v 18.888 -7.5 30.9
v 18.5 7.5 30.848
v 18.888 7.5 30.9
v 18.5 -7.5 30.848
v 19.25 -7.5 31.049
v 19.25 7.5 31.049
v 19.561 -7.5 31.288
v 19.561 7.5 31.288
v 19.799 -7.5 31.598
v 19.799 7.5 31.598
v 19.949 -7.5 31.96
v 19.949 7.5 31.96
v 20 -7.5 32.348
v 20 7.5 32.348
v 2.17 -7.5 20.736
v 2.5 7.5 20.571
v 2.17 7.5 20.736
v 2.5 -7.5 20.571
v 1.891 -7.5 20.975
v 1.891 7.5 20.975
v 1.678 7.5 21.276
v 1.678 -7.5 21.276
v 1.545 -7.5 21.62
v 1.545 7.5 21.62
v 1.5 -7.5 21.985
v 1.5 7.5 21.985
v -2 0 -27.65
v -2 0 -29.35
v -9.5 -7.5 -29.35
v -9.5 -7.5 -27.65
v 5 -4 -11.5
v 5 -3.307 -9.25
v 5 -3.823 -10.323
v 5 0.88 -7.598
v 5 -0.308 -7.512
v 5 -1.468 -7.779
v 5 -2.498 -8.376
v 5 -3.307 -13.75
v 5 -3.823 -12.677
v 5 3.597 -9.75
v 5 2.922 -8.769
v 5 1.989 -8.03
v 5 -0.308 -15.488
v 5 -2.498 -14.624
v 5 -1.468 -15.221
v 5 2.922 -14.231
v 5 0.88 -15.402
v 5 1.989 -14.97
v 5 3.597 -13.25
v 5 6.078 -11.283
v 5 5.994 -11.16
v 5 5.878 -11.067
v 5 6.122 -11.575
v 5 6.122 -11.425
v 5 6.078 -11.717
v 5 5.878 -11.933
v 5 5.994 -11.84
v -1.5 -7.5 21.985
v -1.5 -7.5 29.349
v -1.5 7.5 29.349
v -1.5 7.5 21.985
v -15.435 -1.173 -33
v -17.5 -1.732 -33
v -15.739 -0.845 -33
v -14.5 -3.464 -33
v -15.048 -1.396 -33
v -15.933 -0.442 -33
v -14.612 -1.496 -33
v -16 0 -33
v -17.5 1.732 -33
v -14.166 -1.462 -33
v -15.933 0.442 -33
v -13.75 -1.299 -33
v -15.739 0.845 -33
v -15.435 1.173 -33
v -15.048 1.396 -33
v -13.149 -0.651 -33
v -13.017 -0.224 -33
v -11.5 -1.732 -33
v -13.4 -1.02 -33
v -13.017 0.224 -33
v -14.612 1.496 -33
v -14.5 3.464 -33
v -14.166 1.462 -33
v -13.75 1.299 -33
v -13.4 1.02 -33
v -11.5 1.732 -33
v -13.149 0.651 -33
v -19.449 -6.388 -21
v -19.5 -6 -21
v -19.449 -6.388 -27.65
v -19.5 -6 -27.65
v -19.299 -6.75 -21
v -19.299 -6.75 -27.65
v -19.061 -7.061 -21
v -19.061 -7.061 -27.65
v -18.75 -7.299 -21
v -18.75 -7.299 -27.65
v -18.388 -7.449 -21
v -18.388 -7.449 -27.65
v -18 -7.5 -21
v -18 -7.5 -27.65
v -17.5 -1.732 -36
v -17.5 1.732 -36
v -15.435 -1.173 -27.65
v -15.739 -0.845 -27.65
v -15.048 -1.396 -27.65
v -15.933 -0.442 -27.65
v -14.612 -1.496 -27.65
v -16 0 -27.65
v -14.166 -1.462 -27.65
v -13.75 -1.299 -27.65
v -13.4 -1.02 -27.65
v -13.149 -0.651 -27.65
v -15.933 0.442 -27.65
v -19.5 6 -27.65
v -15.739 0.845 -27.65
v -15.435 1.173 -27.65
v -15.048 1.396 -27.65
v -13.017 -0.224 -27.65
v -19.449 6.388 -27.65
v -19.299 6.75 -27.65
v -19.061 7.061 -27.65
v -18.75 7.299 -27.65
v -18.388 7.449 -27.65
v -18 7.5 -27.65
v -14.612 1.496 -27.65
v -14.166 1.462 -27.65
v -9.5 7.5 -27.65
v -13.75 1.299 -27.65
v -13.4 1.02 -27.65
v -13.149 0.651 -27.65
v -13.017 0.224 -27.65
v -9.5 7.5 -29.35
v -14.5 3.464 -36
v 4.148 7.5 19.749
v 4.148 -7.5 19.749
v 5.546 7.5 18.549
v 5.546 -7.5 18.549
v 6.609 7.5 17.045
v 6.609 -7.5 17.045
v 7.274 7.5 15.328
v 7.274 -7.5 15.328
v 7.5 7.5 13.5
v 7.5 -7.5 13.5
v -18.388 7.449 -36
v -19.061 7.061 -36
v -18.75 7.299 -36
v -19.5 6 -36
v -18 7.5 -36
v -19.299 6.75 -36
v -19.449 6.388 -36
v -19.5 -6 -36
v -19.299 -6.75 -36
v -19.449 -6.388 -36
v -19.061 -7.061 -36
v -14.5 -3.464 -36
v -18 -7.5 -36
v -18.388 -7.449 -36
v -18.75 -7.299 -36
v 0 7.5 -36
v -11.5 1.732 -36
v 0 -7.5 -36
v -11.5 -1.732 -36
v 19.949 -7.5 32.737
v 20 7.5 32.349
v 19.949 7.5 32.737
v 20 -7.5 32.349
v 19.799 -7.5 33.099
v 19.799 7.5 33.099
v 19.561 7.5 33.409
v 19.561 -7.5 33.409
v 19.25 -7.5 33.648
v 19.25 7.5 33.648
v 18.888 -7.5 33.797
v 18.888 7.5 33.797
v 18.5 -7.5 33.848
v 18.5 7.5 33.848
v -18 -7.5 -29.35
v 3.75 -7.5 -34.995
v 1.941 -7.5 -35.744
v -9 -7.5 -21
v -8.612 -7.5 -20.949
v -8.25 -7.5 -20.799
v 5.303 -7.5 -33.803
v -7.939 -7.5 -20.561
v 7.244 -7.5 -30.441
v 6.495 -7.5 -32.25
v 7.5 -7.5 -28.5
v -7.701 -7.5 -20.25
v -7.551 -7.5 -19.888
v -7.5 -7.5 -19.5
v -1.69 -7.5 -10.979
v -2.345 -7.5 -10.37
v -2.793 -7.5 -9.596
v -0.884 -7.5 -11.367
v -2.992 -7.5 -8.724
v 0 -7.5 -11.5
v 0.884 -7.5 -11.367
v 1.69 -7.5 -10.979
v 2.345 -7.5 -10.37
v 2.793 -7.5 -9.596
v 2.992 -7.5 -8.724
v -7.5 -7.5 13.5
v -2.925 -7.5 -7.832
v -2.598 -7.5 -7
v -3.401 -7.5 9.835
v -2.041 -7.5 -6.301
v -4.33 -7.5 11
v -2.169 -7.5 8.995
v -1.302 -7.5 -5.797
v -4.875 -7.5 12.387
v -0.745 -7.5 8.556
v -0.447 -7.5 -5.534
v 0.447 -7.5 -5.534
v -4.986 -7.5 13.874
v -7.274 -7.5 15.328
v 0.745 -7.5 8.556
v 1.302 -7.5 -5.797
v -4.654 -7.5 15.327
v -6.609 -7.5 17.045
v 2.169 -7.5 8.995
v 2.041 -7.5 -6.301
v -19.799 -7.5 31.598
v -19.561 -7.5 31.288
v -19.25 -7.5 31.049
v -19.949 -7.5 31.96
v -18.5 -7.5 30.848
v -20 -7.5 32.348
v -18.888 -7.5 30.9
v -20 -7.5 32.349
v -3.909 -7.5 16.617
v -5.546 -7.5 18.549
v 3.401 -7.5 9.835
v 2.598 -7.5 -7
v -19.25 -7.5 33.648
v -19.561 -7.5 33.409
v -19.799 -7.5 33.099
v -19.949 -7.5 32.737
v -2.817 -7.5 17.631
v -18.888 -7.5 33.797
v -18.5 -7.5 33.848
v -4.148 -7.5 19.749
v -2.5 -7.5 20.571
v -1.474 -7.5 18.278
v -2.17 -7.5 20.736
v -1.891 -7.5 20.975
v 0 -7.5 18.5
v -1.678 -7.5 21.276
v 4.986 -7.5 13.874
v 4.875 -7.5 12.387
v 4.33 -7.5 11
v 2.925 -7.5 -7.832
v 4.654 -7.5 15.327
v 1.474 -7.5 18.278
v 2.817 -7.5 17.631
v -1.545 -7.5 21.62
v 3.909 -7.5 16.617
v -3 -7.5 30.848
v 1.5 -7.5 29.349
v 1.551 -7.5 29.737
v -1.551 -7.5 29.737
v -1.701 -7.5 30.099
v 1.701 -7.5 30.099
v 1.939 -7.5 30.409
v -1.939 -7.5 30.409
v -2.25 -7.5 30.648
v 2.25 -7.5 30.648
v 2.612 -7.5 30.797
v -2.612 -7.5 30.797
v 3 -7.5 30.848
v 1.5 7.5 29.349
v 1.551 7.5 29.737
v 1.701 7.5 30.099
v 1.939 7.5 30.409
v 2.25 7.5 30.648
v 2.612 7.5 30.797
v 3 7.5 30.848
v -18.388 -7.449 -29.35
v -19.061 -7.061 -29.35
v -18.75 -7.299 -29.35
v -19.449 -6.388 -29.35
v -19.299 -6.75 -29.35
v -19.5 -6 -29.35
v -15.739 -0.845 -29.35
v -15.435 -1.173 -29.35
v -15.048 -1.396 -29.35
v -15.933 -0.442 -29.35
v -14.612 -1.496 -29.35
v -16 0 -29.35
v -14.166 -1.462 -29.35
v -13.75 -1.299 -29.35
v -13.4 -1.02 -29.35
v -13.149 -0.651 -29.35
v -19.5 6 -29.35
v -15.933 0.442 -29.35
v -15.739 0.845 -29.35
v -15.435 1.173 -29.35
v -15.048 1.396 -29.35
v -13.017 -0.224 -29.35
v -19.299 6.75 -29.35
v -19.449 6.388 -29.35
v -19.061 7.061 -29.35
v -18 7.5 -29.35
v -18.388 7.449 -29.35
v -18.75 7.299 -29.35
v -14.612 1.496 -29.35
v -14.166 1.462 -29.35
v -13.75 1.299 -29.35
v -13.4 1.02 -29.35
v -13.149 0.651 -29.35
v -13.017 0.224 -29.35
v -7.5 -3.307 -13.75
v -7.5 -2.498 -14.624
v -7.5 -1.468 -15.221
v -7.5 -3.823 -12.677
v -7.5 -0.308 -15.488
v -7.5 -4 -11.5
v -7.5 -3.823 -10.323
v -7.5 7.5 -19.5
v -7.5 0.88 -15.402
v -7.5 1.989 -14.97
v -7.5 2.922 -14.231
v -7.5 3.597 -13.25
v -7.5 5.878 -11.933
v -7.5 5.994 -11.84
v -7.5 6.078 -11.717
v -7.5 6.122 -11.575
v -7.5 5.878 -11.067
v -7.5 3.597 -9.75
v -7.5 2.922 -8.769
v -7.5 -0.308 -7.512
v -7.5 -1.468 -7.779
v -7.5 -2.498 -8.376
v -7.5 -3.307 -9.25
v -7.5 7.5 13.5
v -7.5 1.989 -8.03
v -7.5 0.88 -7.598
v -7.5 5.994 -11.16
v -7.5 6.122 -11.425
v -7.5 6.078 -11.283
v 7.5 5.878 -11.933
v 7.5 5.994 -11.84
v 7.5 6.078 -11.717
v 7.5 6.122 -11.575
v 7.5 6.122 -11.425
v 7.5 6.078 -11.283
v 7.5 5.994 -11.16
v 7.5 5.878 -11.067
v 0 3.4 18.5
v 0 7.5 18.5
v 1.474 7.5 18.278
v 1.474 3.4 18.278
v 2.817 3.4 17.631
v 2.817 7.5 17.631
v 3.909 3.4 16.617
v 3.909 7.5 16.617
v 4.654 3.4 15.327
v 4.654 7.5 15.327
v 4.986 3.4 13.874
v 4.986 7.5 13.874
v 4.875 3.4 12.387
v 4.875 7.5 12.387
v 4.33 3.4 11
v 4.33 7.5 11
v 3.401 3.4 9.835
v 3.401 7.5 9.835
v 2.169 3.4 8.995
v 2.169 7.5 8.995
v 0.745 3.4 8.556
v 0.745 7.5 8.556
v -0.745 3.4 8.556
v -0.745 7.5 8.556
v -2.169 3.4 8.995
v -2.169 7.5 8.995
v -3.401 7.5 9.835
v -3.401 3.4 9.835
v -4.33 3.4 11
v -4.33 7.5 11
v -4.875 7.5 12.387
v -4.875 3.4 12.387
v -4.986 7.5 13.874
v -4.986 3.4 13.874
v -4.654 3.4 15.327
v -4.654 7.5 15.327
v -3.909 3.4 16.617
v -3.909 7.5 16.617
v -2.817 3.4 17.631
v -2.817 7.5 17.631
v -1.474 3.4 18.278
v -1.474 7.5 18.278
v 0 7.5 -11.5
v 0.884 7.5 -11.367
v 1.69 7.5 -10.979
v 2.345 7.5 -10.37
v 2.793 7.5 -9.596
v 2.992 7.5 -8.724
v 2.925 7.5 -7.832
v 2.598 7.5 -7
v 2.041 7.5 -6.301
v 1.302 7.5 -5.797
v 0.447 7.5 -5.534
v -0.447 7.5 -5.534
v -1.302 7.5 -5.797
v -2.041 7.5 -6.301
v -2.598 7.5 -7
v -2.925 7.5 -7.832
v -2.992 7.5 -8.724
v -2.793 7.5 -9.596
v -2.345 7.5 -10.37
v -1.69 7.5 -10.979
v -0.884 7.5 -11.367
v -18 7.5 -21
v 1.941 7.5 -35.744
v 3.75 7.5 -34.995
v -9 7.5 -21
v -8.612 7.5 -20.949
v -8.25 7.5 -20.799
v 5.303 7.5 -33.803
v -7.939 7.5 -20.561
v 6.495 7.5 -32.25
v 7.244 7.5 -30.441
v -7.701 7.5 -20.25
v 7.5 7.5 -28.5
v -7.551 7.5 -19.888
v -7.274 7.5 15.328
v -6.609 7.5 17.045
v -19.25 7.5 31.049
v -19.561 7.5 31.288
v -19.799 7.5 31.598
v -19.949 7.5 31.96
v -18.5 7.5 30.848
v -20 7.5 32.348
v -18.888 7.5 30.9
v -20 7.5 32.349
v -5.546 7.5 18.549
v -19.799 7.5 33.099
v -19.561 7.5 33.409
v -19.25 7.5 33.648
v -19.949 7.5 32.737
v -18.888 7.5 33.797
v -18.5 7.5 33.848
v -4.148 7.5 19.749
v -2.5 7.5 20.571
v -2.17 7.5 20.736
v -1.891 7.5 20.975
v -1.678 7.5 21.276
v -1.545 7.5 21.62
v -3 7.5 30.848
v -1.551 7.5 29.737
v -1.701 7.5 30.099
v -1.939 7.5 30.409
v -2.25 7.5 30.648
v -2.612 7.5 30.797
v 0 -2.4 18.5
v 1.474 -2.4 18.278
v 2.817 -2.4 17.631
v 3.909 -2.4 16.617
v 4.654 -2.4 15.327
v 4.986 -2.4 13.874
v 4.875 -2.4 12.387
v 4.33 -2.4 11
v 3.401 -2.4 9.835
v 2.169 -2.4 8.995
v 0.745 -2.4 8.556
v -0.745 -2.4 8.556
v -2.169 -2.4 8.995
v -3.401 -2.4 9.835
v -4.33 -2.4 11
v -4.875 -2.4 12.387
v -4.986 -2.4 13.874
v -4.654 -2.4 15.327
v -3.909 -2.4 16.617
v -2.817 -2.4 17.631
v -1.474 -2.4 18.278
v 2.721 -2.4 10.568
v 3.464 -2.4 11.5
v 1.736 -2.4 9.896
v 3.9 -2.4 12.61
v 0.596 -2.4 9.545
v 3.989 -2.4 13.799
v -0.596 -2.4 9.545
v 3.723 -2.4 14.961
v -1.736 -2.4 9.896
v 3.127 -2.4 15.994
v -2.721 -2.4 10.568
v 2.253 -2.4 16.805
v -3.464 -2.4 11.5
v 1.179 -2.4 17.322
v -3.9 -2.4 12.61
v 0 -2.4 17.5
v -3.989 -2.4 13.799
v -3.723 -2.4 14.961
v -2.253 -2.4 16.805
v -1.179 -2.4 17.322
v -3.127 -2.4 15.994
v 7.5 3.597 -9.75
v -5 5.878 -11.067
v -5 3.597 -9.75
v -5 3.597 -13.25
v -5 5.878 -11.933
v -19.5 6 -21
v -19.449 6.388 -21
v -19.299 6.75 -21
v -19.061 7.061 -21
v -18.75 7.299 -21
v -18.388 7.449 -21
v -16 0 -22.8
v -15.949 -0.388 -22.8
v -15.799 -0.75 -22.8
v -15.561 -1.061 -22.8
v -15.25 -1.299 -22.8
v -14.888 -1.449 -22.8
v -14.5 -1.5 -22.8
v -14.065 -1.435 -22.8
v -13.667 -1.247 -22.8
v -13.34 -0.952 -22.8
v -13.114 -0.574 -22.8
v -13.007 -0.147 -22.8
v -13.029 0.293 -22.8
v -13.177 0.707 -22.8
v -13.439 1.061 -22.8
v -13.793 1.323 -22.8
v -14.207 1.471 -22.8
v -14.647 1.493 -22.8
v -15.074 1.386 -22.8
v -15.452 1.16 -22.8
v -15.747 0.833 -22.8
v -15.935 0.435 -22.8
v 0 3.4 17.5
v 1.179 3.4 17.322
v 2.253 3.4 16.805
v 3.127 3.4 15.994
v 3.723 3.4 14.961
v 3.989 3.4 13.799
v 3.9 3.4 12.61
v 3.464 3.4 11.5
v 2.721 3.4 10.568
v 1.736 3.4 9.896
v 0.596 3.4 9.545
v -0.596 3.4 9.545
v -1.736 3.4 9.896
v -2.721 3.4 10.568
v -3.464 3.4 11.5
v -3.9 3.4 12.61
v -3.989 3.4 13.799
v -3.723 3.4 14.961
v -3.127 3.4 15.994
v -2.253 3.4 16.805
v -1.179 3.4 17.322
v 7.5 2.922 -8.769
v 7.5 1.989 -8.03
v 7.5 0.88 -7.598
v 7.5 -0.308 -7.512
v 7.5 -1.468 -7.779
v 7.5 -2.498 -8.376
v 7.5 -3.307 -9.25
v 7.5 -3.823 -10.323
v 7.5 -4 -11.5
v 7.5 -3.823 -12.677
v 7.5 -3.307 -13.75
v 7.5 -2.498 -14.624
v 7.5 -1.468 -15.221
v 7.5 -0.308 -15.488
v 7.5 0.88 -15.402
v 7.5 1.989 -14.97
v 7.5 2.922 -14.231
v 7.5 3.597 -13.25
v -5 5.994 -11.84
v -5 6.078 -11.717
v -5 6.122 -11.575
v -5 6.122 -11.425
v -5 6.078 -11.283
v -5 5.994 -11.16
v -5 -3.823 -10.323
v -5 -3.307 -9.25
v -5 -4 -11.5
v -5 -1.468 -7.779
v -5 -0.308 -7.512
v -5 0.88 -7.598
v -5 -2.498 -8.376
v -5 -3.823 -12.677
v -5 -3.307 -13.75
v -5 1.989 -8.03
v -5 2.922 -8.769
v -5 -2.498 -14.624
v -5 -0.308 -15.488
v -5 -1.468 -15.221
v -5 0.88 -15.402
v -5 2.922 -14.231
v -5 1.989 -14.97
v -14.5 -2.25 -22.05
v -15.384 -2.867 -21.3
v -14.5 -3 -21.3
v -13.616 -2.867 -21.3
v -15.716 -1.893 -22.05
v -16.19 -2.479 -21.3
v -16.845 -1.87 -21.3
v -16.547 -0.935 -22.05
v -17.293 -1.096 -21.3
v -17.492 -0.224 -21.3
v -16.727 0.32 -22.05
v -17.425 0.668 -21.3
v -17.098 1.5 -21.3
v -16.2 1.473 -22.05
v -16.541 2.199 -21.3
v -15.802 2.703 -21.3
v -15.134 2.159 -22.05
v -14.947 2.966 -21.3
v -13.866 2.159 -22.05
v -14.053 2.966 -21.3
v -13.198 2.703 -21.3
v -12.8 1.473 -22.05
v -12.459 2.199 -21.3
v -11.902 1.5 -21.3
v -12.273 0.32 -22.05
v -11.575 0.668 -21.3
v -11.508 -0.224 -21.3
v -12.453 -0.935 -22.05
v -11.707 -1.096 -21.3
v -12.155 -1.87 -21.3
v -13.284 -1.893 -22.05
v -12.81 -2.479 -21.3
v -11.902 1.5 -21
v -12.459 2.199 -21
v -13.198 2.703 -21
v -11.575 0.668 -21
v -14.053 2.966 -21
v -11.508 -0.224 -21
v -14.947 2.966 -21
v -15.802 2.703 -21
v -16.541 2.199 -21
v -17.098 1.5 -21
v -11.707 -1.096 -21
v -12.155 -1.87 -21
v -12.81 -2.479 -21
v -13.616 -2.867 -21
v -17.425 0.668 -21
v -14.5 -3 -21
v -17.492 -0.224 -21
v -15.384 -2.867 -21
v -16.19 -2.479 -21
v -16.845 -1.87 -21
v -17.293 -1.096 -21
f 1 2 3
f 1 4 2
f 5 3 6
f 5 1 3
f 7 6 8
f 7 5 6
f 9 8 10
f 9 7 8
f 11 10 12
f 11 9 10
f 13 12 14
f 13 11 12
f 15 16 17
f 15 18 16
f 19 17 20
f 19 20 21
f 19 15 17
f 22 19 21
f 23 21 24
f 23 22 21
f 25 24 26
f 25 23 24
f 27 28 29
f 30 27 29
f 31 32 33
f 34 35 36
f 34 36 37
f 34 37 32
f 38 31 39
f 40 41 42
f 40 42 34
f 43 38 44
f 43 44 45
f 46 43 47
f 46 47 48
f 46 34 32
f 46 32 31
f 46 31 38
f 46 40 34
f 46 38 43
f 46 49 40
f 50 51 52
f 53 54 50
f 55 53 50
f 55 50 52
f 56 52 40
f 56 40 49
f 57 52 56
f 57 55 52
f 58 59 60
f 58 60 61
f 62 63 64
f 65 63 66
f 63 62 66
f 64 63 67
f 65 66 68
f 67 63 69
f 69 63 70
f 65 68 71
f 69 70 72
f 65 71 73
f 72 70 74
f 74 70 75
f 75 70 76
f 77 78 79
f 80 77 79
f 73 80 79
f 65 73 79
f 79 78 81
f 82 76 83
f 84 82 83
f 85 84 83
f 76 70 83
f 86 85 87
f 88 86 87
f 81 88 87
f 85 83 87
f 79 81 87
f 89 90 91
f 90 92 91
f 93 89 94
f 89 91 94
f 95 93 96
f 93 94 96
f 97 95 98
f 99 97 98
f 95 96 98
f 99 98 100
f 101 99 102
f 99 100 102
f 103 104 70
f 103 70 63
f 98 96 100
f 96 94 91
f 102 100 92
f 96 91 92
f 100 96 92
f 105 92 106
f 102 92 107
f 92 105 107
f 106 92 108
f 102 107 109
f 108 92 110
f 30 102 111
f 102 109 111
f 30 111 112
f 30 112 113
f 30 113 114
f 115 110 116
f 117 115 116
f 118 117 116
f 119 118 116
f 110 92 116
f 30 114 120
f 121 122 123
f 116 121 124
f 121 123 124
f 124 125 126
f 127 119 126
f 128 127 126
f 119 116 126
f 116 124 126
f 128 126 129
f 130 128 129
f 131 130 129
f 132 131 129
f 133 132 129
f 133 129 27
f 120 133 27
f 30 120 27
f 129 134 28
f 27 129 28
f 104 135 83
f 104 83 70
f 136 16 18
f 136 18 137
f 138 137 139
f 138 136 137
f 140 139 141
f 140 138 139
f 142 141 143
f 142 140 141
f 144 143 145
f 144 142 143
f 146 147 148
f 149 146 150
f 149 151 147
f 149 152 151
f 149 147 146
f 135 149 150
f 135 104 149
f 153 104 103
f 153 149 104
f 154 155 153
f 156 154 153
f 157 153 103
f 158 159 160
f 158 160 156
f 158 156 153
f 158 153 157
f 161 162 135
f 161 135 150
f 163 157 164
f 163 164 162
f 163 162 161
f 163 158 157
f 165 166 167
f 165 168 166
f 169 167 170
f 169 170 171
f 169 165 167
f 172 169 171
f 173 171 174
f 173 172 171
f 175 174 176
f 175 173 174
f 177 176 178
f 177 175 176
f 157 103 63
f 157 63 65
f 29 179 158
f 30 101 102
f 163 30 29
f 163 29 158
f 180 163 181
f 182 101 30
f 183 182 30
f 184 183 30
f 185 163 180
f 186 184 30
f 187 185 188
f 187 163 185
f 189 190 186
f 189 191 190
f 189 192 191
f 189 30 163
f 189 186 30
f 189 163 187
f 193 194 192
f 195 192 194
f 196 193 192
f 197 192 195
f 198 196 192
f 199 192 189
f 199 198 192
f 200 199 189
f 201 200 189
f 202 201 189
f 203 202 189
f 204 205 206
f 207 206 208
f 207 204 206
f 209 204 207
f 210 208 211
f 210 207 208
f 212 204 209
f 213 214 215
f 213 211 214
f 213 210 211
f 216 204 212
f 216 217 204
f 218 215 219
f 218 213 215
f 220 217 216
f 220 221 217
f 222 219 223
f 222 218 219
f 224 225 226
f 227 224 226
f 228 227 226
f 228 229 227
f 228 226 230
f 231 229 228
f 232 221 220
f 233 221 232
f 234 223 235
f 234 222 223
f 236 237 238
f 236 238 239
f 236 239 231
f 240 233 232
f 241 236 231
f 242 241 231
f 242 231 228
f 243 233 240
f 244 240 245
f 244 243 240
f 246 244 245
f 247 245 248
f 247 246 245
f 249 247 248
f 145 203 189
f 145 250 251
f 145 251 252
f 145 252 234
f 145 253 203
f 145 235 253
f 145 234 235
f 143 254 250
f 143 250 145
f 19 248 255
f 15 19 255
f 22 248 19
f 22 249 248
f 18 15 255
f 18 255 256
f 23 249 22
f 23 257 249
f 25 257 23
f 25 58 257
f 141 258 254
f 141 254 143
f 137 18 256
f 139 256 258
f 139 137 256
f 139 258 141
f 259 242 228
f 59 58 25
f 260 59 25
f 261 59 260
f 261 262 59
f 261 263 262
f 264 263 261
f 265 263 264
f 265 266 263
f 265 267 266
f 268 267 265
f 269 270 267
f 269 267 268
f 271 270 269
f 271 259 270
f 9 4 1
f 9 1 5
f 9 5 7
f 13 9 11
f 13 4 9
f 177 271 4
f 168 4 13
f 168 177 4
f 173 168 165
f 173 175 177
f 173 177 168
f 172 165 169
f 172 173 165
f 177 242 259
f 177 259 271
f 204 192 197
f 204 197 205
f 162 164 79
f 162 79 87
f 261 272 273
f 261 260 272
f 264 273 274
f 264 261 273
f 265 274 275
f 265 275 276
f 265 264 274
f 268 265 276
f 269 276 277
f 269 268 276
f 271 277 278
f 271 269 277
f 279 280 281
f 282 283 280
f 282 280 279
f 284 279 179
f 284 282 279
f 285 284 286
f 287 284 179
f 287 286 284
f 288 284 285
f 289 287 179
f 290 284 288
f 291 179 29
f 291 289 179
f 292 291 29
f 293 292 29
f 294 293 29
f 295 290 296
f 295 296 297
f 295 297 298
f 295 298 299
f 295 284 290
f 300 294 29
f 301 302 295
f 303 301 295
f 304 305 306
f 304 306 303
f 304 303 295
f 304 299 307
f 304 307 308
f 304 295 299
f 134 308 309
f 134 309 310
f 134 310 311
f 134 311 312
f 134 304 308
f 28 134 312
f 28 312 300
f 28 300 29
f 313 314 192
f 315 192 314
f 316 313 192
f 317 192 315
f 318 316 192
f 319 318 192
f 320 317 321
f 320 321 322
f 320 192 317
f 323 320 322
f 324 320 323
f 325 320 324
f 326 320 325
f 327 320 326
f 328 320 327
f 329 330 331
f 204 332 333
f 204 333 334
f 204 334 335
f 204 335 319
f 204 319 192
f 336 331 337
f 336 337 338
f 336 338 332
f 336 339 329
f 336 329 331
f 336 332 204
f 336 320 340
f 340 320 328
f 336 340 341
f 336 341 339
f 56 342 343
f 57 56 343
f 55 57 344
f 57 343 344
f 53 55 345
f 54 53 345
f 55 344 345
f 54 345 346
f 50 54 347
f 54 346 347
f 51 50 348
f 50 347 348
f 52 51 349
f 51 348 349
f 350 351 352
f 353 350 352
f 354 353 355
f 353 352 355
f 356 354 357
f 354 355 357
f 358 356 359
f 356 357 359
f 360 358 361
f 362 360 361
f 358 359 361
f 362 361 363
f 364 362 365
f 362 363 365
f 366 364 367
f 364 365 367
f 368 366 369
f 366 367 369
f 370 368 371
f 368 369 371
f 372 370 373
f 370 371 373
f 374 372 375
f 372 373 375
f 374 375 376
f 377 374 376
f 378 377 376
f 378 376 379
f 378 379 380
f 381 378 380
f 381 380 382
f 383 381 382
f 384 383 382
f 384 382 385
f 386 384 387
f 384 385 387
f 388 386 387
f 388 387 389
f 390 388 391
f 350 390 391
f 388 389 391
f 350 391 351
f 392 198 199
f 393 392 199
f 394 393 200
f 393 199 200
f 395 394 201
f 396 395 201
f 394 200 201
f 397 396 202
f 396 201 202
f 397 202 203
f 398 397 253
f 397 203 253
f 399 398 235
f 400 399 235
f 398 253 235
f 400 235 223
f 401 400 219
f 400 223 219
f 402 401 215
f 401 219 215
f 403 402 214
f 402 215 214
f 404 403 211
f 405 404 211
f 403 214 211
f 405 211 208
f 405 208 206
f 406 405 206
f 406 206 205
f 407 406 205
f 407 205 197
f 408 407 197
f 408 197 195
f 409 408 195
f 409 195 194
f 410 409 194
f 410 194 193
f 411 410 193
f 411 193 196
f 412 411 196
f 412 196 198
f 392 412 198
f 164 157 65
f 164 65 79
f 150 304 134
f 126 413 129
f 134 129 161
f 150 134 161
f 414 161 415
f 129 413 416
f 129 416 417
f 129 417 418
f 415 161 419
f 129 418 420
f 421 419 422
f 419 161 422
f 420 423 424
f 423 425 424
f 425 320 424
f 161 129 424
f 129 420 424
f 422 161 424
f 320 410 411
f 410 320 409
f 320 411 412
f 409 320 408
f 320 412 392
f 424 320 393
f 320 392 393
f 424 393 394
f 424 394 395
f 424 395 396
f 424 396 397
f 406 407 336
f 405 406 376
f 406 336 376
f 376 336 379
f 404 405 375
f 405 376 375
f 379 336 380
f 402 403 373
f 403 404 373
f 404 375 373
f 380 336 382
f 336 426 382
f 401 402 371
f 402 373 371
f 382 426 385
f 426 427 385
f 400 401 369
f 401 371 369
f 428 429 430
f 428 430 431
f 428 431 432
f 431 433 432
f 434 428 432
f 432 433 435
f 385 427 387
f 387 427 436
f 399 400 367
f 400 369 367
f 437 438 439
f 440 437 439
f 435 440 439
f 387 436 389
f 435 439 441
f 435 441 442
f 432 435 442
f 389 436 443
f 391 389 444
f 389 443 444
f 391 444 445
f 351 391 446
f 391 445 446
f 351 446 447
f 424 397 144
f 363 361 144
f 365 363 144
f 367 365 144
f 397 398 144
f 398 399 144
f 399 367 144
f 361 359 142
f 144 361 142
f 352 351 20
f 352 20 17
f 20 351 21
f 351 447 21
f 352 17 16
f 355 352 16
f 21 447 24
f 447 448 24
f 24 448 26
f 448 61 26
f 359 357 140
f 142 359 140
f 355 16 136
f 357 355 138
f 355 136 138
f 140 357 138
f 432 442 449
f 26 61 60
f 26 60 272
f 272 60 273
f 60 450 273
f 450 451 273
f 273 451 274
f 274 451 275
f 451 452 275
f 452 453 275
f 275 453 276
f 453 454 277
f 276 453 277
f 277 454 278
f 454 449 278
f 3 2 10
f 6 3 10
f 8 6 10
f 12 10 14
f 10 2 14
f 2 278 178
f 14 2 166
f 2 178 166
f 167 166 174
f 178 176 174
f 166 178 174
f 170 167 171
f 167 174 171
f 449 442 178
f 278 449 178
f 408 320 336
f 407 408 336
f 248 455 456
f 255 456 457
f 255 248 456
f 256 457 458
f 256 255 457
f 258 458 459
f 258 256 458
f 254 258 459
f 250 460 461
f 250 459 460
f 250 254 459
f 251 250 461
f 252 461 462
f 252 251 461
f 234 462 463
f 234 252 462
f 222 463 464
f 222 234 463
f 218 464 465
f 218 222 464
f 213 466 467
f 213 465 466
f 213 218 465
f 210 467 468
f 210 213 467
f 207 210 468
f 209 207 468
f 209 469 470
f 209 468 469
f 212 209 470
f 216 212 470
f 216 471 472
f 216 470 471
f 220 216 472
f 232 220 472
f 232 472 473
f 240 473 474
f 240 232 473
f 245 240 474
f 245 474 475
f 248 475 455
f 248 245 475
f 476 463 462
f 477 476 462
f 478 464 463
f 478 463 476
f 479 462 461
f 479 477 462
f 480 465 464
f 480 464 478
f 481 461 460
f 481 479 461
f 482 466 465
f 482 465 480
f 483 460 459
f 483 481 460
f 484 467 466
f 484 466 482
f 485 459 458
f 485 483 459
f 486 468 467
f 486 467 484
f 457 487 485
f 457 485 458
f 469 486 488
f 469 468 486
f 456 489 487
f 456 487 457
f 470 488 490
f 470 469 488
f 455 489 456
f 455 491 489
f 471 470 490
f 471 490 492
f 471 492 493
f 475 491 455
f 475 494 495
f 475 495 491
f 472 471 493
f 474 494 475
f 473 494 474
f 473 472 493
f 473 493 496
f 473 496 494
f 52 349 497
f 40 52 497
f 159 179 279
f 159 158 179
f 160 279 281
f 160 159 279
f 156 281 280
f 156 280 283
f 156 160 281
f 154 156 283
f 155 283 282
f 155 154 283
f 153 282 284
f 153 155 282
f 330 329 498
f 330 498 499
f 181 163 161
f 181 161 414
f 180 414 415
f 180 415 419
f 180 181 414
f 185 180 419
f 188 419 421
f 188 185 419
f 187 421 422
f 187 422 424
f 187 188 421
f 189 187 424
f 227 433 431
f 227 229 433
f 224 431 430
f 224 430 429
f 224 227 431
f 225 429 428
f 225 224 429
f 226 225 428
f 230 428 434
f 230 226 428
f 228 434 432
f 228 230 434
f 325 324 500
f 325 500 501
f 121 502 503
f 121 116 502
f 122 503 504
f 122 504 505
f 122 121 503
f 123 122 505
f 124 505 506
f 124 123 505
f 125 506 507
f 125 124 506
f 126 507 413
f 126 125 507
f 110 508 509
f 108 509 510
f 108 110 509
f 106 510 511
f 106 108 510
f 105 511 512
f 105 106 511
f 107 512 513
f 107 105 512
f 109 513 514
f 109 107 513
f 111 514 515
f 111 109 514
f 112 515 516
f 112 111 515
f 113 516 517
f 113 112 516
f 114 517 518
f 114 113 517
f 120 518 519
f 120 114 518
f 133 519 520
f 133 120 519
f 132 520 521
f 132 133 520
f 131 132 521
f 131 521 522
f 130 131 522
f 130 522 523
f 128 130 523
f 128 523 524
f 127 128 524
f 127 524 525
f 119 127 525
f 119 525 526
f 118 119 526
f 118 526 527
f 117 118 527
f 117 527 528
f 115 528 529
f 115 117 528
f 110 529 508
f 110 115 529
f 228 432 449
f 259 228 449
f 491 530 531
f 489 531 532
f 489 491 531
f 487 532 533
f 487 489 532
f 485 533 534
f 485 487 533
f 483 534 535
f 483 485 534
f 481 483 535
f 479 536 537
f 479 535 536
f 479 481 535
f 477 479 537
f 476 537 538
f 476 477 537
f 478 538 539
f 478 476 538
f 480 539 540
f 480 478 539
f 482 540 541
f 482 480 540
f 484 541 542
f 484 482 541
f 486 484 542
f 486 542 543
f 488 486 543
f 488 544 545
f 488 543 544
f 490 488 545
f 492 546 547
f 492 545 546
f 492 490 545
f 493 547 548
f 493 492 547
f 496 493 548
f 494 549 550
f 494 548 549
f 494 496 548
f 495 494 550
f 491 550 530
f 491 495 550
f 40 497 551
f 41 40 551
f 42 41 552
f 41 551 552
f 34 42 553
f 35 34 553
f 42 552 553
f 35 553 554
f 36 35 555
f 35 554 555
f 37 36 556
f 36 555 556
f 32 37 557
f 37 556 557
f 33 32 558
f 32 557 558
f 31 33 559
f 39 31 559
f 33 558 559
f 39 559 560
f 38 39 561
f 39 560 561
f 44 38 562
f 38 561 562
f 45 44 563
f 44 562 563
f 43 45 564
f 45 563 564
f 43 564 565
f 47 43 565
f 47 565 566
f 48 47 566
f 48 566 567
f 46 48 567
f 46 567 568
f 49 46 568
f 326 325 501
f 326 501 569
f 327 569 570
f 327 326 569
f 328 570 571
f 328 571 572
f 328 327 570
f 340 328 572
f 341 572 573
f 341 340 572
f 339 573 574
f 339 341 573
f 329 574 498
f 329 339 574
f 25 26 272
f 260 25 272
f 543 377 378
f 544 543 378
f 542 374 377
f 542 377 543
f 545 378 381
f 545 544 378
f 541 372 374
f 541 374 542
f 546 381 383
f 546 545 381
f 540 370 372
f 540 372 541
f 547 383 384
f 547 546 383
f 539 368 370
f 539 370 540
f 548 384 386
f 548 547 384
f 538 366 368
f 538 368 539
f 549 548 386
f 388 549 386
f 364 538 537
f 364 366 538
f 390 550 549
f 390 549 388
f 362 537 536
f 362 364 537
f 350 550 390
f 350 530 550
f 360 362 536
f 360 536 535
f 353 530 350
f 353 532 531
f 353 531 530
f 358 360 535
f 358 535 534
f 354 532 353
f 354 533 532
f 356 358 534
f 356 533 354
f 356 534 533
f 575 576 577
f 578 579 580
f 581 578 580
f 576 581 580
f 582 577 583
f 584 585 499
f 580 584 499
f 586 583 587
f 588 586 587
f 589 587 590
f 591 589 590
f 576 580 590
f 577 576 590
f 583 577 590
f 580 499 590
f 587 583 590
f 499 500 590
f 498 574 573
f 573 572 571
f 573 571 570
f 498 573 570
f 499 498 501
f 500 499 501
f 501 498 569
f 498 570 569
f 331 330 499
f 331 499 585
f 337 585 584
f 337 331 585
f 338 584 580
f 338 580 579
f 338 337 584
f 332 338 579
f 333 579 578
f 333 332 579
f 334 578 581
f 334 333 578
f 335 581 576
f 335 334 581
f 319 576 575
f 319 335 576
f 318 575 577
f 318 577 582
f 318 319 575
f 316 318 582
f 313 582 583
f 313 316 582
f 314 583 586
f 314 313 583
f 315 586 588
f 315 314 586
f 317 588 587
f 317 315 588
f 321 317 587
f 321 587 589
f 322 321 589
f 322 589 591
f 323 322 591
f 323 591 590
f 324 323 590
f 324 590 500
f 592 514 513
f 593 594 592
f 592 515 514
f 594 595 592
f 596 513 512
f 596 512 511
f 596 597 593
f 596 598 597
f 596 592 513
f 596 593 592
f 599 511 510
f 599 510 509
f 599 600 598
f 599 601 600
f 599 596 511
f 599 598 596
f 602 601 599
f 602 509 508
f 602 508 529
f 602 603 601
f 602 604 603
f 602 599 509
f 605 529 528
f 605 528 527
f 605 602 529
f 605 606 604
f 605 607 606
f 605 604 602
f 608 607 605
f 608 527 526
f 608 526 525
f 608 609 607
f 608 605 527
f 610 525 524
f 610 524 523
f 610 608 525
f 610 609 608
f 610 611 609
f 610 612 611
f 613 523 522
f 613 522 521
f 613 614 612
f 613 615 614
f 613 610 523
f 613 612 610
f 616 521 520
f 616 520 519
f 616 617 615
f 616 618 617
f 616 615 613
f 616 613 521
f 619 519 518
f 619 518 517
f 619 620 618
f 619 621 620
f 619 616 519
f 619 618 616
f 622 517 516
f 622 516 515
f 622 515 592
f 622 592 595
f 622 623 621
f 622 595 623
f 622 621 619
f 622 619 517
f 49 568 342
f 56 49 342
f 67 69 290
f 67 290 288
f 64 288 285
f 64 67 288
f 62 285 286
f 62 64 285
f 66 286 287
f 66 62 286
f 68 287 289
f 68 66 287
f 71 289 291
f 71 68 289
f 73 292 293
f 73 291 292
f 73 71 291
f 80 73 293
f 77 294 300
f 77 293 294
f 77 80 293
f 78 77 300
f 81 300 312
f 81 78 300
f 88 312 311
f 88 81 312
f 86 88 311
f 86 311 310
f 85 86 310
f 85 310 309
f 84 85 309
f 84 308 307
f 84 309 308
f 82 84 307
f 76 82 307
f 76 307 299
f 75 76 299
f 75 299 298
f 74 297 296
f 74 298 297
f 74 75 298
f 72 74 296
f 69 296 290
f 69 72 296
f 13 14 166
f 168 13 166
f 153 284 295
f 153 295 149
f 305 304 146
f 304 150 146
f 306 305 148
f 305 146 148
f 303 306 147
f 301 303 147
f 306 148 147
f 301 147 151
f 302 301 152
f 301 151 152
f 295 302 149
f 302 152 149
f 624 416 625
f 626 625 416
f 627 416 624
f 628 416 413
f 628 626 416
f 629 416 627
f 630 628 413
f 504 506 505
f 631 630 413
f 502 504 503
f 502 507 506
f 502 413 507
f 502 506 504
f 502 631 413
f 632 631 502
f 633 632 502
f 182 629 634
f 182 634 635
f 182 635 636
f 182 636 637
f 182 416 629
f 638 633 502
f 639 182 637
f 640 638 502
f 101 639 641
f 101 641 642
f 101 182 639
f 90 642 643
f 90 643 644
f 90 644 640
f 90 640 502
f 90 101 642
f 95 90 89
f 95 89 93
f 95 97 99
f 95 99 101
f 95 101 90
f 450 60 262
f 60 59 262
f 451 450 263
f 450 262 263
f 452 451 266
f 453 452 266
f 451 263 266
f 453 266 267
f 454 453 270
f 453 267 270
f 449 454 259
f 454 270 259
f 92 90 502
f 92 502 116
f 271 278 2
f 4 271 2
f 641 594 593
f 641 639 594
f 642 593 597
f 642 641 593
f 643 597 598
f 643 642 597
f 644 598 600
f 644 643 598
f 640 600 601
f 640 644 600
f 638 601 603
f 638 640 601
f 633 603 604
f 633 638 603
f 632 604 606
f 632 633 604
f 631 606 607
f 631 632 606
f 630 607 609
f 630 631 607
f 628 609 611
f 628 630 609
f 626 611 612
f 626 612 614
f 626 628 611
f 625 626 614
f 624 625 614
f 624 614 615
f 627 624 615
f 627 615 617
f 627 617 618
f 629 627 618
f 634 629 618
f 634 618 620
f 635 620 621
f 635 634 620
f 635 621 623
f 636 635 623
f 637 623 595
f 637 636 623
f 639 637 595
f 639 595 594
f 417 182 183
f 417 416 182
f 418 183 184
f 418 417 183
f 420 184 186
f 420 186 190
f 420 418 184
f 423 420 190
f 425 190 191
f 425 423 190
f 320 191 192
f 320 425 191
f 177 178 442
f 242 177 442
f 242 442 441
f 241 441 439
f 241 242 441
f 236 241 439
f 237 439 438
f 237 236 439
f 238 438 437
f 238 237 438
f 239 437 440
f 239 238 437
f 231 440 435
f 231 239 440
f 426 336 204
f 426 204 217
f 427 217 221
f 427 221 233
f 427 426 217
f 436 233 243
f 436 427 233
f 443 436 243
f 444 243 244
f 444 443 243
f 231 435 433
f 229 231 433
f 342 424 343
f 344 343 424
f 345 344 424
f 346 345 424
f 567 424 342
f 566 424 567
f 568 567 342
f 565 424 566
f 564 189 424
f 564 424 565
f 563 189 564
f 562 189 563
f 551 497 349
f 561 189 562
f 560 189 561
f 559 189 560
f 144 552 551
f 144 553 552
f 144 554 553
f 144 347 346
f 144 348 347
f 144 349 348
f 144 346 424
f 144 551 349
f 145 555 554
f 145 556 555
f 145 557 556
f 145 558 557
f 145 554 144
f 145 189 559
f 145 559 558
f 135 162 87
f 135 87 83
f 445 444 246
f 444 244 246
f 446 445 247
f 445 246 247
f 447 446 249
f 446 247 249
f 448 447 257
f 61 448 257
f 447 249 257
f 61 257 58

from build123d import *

# Parameters (mm, degrees)
SKETCH1_R           = 4
BOSS_EXTRUDE1_DEPTH = 7.5
SKETCH2_R           = 5
CUT_EXTRUDE1_DEPTH  = 4.1
SKETCH12_R          = 5
SKETCH12_R_2        = 4
CUT_EXTRUDE10_DEPTH = 1
CUT_EXTRUDE3_DEPTH  = 2.5
BOSS_EXTRUDE3_DEPTH = 15
CUT_EXTRUDE7_REACH  = 45.603
SKETCH7_W           = 10
SKETCH7_H           = 1.7
CUT_EXTRUDE8_REACH  = 76.732
SKETCH8_R           = 1.5
CUT_EXTRUDE9_DEPTH  = 3
CUT_EXTRUDE11_DEPTH = 1.7
BOSS_EXTRUDE2_START = -15
BOSS_EXTRUDE2_DEPTH = 15
FILLET8_R           = 1.5
CUT_EXTRUDE12_REACH = 45.829
SKETCH19_R          = 3


with BuildPart() as part:
    # Sketch1 → Boss-Extrude1 (new, symmetric)
    with BuildSketch(Plane(origin=(0, 0, 0), x_dir=(1, 0, 0), z_dir=(0, 1, 0))):
        with BuildLine():
            Line((7.5, 21), (-7.5, 21))
            Line((-7.5, 21), (-7.5, -13.499999984))
            ThreePointArc((-7.5, -13.499999984), (-8e-09, -21), (7.5, -13.5))
            Line((7.5, -13.5), (7.5, 21))
        make_face()
        with Locations(Location((0, -13.5, 0), (0, 0, 270))):
            Circle(SKETCH1_R, mode=Mode.SUBTRACT)
    extrude(amount=BOSS_EXTRUDE1_DEPTH, both=True)

    # Sketch2 → Cut-Extrude1 (cut)
    with BuildSketch(Plane(origin=(0, 7.5, 0), x_dir=(1, 0, 0), z_dir=(0, 1, 0))):
        with Locations(Location((0, -13.5, 0), (0, 0, 270))):
            Circle(SKETCH2_R)
    cut_extrude1 = extrude(amount=-CUT_EXTRUDE1_DEPTH, mode=Mode.SUBTRACT)

    # Mirror1: Cut-Extrude1 across plane
    add(cut_extrude1.mirror(Plane.ZX), mode=Mode.SUBTRACT)

    # Sketch12 → Cut-Extrude10 (cut)
    with BuildSketch(Plane.XZ.offset(3.4)):
        with Locations(Location((0, 13.5, 0), (0, 0, 90))):
            Circle(SKETCH12_R)
        with Locations(Location((0, 13.5, 0), (0, 0, 270))):
            Circle(SKETCH12_R_2, mode=Mode.SUBTRACT)
    extrude(amount=-CUT_EXTRUDE10_DEPTH, mode=Mode.SUBTRACT)

    # Sketch4 → Cut-Extrude3 (cut)
    with BuildSketch(Plane(origin=(7.5, 0, 0), x_dir=(0, 0, -1), z_dir=(1, 0, 0))):
        with BuildLine():
            Line((13.25, 3.596873642), (11.933012728, 5.87796251))
            ThreePointArc((11.933012728, 5.87796251), (11.500000041, 6.127962556), (11.066987313, 5.877962581))
            Line((11.066987313, 5.877962581), (9.75, 3.596873642))
            ThreePointArc((9.75, 3.596873642), (11.5, -4), (13.25, 3.596873642))
        make_face()
    cut_extrude3 = extrude(amount=-CUT_EXTRUDE3_DEPTH, mode=Mode.SUBTRACT)

    # Mirror2: Cut-Extrude3 across plane
    add(cut_extrude3.mirror(Plane(origin=(0, 0, 0), x_dir=(0, 0, 1), z_dir=(1, 0, 0))), mode=Mode.SUBTRACT)

    # Sketch18 → Boss-Extrude3 (add)
    with BuildSketch(Plane.XZ.offset(7.5)):
        with BuildLine():
            Line((-19.5, -21), (-19.5, -36))
            Line((-19.5, -36), (0, -36))
            ThreePointArc((0, -36), (5.303300859, -33.803300859), (7.5, -28.5))
            Line((7.5, -28.5), (7.5, -21))
            Line((7.5, -21), (-19.5, -21))
        make_face()
    extrude(amount=-BOSS_EXTRUDE3_DEPTH)

    # Sketch7 → Cut-Extrude7 (cut, up to next)
    with BuildSketch(Plane(origin=(0, 7.5, 0), x_dir=(1, 0, 0), z_dir=(0, 1, 0)), mode=Mode.PRIVATE) as cut_extrude7_sk1:
        with Locations((-14.5, 28.5)):
            Rectangle(SKETCH7_W, SKETCH7_H)
    cut_extrude7_tool1 = extrude(cut_extrude7_sk1.sketch, amount=-CUT_EXTRUDE7_REACH, mode=Mode.PRIVATE) & part.part
    add(cut_extrude7_tool1.solids().sort_by_distance((-14.5, 7.5, -28.5))[0], mode=Mode.SUBTRACT)

    # Cut-Extrude8: up to this face of the body (flat: up to its plane)
    cut_extrude8_end = Plane(part.part.faces().sort_by_distance((-13.5, 0, -21))[0])
    # Sketch8 → Cut-Extrude8 (cut, up to the picked face)
    with BuildSketch(Plane(origin=(-40.245190528, 0, -36), x_dir=(1, 0, 0), z_dir=(0, 0, 1)), mode=Mode.PRIVATE) as cut_extrude8_sk1:
        with Locations(Location((25.745190528, 0, 0), (0, 0, 180))):
            Circle(SKETCH8_R)
    cut_extrude8_tool1 = split(extrude(cut_extrude8_sk1.sketch, amount=CUT_EXTRUDE8_REACH, mode=Mode.PRIVATE), bisect_by=cut_extrude8_end, keep=Keep.BOTH, mode=Mode.PRIVATE)
    add(cut_extrude8_tool1.solids().sort_by(Axis((-14.5, 0, -36), (0, 0, 1)))[0], mode=Mode.SUBTRACT)

    # Sketch10 → CSK for M3 Flat Head Machine Screw1 (revolve, cut)
    with BuildSketch(Plane(origin=(-14.5, 0, -21), x_dir=(0, -1, 0), z_dir=(1, 0, 0))):
        Polygon((0, 0), (0, 5.901290929), (1.5, 5), (1.5, 1.8), (3, 0.3), (3, 0), align=None)
    revolve(axis=Axis((-14.5, 0, -14.65), (0, 0, -1)), mode=Mode.SUBTRACT)

    # Sketch11 → Cut-Extrude9 (cut)
    with BuildSketch(Plane(origin=(15, 0, -36), x_dir=(1, 0, 0), z_dir=(0, 0, 1))):
        Polygon((-29.5, -3.464101615), (-26.5, -1.732050808), (-26.5, 1.732050808), (-29.5, 3.464101615), (-32.5, 1.732050808), (-32.5, -1.732050808), align=None)
    extrude(amount=CUT_EXTRUDE9_DEPTH, mode=Mode.SUBTRACT)

    # Sketch13 → Cut-Extrude11 (cut)
    with BuildSketch(Plane(origin=(-44.653589838, 0, -29.35), x_dir=(1, 0, 0), z_dir=(0, 0, 1))):
        Polygon((35.153589838, 7.5), (42.653589838, 0), (35.153589838, -7.5), align=None)
    extrude(amount=CUT_EXTRUDE11_DEPTH, mode=Mode.SUBTRACT)

    # Sketch16 → Boss-Extrude2 (add)
    with BuildSketch(Plane.XZ.offset(7.5).offset(BOSS_EXTRUDE2_START)):
        with BuildLine():
            Line((1.5, 30.848469228), (-1.5, 30.848469228))
            Line((-1.5, 30.848469228), (-1.5, 20.848469228))
            ThreePointArc((-1.5, 20.848469228), (0, 21), (1.5, 20.848469228))
            Line((1.5, 20.848469228), (1.5, 30.848469228))
        make_face()
        Polygon((-20, 30.848469228), (-1.5, 30.848469228), (1.5, 30.848469228), (20, 30.848469228), (20, 33.848469228), (-20, 33.848469228), align=None)
    extrude(amount=BOSS_EXTRUDE2_DEPTH)

    # Fillet8
    fillet8_edges = [part.edges().sort_by_distance(p)[0] for p in [
        (20, 0, 30.848469228),
        (20, 0, 33.848469228),
        (-20, 0, 33.848469228),
        (-20, 0, 30.848469228),
        (-1.5, 0, 30.848469228),
        (-1.5, 0, 20.848469228),
        (1.5, 0, 20.848469228),
        (1.5, 0, 30.848469228),
        (-19.5, -7.5, -24.325),
        (-19.5, 7.5, -24.325),
        (-19.5, 7.5, -32.675),
        (-19.5, -7.5, -32.675),
        (-7.5, 0, -21),
    ]]
    fillet(fillet8_edges, radius=FILLET8_R - 0.0001)  # a hair under: the kernel refuses the full size

    # Sketch19 → Cut-Extrude12 (cut, up to next)
    with BuildSketch(Plane.XZ.offset(7.5), mode=Mode.PRIVATE) as cut_extrude12_sk1:
        with Locations(Location((0, -8.5, 0), (0, 0, 270))):
            Circle(SKETCH19_R)
    cut_extrude12_tool1 = extrude(cut_extrude12_sk1.sketch, amount=-CUT_EXTRUDE12_REACH, mode=Mode.PRIVATE) & part.part
    add(cut_extrude12_tool1.solids().sort_by_distance((0, -7.5, -8.5))[0], mode=Mode.SUBTRACT)


solid = part.part
